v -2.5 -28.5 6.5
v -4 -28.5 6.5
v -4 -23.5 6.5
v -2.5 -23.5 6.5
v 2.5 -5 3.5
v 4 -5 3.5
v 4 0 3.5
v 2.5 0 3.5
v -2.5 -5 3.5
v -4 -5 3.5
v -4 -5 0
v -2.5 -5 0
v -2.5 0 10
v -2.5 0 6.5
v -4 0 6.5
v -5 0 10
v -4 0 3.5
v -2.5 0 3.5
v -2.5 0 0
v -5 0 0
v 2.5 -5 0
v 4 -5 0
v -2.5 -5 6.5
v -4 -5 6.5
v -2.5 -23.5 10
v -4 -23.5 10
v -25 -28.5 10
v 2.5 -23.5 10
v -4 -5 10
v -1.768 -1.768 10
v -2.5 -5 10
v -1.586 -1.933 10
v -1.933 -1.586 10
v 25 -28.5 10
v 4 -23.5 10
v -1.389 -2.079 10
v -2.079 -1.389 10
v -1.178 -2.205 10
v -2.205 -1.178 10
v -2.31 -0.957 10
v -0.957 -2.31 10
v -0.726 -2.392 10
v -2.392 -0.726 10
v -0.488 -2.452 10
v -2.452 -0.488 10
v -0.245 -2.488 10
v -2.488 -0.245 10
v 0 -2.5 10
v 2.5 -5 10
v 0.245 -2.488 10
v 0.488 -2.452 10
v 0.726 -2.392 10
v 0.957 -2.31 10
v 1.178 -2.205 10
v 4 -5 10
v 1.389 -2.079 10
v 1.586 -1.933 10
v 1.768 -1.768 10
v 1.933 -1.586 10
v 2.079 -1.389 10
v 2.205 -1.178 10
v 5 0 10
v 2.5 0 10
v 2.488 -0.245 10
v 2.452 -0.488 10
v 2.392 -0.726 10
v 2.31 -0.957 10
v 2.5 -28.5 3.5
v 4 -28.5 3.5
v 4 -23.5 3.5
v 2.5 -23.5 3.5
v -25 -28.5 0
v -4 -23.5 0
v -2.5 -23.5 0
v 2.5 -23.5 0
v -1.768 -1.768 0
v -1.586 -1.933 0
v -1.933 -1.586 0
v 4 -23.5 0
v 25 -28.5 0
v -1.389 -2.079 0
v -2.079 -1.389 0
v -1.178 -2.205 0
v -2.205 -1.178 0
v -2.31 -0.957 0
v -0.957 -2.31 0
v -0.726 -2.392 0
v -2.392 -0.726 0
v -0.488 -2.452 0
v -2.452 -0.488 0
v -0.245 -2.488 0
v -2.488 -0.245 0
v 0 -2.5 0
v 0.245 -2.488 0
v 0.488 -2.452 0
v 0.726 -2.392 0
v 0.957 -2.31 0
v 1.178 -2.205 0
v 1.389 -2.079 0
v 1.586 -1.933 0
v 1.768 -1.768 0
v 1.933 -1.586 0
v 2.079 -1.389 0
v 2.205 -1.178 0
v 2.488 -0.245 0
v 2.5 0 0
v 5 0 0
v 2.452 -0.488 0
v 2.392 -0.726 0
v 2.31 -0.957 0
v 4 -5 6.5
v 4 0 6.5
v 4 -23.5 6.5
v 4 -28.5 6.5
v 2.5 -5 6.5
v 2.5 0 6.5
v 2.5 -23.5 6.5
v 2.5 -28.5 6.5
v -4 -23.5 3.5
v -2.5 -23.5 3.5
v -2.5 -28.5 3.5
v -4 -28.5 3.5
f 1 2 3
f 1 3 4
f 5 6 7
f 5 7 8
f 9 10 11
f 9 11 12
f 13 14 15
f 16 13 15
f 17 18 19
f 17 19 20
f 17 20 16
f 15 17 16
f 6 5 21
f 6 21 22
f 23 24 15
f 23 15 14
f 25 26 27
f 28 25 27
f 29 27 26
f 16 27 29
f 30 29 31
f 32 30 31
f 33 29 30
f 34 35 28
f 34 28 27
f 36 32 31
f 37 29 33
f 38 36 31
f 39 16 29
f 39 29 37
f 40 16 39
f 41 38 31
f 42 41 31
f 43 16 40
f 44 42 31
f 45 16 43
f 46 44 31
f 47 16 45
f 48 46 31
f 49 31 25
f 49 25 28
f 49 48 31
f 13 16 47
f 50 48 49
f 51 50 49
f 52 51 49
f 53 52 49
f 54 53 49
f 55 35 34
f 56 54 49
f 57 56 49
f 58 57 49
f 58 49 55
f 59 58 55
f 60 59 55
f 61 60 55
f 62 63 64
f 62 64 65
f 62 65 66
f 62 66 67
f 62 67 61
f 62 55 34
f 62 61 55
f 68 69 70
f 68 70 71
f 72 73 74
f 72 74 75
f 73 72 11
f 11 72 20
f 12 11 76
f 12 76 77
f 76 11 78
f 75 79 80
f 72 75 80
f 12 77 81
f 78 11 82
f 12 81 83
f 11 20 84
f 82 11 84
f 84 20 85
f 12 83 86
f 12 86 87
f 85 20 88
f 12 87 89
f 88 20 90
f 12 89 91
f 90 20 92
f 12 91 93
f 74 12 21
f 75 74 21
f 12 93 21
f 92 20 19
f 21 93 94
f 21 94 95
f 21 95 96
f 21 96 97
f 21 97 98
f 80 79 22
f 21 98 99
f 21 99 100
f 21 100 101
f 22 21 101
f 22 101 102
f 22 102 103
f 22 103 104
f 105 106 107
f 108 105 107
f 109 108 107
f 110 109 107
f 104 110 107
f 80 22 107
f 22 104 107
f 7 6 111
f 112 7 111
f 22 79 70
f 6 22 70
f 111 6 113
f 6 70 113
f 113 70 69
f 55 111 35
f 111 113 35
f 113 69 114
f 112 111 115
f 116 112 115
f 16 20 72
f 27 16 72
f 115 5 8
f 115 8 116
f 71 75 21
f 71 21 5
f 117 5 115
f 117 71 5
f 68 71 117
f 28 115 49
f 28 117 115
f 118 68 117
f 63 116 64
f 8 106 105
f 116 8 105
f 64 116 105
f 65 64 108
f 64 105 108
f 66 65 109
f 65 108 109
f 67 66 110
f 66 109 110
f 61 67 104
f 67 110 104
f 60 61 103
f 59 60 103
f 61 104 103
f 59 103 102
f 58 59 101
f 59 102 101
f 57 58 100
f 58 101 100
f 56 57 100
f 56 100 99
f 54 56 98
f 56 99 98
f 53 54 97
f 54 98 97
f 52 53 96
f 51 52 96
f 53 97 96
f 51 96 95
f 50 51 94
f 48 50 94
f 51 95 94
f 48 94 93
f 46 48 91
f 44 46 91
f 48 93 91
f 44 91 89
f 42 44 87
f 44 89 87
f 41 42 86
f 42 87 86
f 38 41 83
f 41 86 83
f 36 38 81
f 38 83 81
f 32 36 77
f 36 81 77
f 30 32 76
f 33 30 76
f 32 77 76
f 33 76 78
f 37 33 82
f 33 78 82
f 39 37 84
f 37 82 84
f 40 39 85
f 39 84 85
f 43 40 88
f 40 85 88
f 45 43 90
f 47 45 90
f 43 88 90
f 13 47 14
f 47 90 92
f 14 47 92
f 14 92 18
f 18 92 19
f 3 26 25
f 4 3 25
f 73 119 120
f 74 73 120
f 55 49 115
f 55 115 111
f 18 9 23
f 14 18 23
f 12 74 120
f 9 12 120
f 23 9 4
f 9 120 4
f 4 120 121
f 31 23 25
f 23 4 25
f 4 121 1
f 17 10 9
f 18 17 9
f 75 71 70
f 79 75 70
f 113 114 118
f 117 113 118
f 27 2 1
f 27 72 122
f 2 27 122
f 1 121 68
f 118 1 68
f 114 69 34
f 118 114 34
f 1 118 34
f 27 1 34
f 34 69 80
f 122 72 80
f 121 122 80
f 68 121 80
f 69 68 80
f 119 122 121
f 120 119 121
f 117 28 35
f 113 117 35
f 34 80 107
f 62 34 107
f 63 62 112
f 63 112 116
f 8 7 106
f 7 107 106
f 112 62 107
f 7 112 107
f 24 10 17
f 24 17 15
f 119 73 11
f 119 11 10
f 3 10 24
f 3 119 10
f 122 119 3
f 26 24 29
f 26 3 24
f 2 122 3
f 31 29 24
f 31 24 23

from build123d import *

# Parameters (mm, degrees)
BOSS_EXTRUDE1_DEPTH = 10
SKETCH4_W           = 1.5
SKETCH4_H           = 3
CUT_EXTRUDE2_DEPTH  = 29.5
SKETCH5_W           = 1.5
SKETCH5_H           = 18.5
CUT_EXTRUDE3_DEPTH  = 11


with BuildPart() as part:
    # Sketch1 → Boss-Extrude1 (new body)
    with BuildSketch(Plane.XY):
        with BuildLine():
            Line((-25, -28.5), (25, -28.5))
            Line((25, -28.5), (5, 0))
            Line((5, 0), (2.5, 0))
            ThreePointArc((2.5, 0), (0, -2.5), (-2.5, 0))
            Line((-2.5, 0), (-5, 0))
            Line((-5, 0), (-25, -28.5))
        make_face()
    extrude(amount=BOSS_EXTRUDE1_DEPTH)

    # Sketch4 → Cut-Extrude2 (cut, through all)
    with BuildSketch(Plane.XZ.offset(28.5)):
        with Locations((-3.25, 5)):
            Rectangle(SKETCH4_W, SKETCH4_H)
    cut_extrude2 = extrude(amount=-CUT_EXTRUDE2_DEPTH, mode=Mode.SUBTRACT)

    # Mirror1: Cut-Extrude2 across plane
    add(cut_extrude2.mirror(Plane(origin=(0, 0, 0), x_dir=(0, 0, 1), z_dir=(1, 0, 0))), mode=Mode.SUBTRACT)

    # Sketch5 → Cut-Extrude3 (cut, through all)
    with BuildSketch(Plane.XY.offset(10)):
        with Locations((-3.25, -14.25)):
            Rectangle(SKETCH5_W, SKETCH5_H)
        with Locations((3.25, -14.25)):
            Rectangle(SKETCH5_W, SKETCH5_H)
    extrude(amount=-CUT_EXTRUDE3_DEPTH, mode=Mode.SUBTRACT)


solid = part.part
